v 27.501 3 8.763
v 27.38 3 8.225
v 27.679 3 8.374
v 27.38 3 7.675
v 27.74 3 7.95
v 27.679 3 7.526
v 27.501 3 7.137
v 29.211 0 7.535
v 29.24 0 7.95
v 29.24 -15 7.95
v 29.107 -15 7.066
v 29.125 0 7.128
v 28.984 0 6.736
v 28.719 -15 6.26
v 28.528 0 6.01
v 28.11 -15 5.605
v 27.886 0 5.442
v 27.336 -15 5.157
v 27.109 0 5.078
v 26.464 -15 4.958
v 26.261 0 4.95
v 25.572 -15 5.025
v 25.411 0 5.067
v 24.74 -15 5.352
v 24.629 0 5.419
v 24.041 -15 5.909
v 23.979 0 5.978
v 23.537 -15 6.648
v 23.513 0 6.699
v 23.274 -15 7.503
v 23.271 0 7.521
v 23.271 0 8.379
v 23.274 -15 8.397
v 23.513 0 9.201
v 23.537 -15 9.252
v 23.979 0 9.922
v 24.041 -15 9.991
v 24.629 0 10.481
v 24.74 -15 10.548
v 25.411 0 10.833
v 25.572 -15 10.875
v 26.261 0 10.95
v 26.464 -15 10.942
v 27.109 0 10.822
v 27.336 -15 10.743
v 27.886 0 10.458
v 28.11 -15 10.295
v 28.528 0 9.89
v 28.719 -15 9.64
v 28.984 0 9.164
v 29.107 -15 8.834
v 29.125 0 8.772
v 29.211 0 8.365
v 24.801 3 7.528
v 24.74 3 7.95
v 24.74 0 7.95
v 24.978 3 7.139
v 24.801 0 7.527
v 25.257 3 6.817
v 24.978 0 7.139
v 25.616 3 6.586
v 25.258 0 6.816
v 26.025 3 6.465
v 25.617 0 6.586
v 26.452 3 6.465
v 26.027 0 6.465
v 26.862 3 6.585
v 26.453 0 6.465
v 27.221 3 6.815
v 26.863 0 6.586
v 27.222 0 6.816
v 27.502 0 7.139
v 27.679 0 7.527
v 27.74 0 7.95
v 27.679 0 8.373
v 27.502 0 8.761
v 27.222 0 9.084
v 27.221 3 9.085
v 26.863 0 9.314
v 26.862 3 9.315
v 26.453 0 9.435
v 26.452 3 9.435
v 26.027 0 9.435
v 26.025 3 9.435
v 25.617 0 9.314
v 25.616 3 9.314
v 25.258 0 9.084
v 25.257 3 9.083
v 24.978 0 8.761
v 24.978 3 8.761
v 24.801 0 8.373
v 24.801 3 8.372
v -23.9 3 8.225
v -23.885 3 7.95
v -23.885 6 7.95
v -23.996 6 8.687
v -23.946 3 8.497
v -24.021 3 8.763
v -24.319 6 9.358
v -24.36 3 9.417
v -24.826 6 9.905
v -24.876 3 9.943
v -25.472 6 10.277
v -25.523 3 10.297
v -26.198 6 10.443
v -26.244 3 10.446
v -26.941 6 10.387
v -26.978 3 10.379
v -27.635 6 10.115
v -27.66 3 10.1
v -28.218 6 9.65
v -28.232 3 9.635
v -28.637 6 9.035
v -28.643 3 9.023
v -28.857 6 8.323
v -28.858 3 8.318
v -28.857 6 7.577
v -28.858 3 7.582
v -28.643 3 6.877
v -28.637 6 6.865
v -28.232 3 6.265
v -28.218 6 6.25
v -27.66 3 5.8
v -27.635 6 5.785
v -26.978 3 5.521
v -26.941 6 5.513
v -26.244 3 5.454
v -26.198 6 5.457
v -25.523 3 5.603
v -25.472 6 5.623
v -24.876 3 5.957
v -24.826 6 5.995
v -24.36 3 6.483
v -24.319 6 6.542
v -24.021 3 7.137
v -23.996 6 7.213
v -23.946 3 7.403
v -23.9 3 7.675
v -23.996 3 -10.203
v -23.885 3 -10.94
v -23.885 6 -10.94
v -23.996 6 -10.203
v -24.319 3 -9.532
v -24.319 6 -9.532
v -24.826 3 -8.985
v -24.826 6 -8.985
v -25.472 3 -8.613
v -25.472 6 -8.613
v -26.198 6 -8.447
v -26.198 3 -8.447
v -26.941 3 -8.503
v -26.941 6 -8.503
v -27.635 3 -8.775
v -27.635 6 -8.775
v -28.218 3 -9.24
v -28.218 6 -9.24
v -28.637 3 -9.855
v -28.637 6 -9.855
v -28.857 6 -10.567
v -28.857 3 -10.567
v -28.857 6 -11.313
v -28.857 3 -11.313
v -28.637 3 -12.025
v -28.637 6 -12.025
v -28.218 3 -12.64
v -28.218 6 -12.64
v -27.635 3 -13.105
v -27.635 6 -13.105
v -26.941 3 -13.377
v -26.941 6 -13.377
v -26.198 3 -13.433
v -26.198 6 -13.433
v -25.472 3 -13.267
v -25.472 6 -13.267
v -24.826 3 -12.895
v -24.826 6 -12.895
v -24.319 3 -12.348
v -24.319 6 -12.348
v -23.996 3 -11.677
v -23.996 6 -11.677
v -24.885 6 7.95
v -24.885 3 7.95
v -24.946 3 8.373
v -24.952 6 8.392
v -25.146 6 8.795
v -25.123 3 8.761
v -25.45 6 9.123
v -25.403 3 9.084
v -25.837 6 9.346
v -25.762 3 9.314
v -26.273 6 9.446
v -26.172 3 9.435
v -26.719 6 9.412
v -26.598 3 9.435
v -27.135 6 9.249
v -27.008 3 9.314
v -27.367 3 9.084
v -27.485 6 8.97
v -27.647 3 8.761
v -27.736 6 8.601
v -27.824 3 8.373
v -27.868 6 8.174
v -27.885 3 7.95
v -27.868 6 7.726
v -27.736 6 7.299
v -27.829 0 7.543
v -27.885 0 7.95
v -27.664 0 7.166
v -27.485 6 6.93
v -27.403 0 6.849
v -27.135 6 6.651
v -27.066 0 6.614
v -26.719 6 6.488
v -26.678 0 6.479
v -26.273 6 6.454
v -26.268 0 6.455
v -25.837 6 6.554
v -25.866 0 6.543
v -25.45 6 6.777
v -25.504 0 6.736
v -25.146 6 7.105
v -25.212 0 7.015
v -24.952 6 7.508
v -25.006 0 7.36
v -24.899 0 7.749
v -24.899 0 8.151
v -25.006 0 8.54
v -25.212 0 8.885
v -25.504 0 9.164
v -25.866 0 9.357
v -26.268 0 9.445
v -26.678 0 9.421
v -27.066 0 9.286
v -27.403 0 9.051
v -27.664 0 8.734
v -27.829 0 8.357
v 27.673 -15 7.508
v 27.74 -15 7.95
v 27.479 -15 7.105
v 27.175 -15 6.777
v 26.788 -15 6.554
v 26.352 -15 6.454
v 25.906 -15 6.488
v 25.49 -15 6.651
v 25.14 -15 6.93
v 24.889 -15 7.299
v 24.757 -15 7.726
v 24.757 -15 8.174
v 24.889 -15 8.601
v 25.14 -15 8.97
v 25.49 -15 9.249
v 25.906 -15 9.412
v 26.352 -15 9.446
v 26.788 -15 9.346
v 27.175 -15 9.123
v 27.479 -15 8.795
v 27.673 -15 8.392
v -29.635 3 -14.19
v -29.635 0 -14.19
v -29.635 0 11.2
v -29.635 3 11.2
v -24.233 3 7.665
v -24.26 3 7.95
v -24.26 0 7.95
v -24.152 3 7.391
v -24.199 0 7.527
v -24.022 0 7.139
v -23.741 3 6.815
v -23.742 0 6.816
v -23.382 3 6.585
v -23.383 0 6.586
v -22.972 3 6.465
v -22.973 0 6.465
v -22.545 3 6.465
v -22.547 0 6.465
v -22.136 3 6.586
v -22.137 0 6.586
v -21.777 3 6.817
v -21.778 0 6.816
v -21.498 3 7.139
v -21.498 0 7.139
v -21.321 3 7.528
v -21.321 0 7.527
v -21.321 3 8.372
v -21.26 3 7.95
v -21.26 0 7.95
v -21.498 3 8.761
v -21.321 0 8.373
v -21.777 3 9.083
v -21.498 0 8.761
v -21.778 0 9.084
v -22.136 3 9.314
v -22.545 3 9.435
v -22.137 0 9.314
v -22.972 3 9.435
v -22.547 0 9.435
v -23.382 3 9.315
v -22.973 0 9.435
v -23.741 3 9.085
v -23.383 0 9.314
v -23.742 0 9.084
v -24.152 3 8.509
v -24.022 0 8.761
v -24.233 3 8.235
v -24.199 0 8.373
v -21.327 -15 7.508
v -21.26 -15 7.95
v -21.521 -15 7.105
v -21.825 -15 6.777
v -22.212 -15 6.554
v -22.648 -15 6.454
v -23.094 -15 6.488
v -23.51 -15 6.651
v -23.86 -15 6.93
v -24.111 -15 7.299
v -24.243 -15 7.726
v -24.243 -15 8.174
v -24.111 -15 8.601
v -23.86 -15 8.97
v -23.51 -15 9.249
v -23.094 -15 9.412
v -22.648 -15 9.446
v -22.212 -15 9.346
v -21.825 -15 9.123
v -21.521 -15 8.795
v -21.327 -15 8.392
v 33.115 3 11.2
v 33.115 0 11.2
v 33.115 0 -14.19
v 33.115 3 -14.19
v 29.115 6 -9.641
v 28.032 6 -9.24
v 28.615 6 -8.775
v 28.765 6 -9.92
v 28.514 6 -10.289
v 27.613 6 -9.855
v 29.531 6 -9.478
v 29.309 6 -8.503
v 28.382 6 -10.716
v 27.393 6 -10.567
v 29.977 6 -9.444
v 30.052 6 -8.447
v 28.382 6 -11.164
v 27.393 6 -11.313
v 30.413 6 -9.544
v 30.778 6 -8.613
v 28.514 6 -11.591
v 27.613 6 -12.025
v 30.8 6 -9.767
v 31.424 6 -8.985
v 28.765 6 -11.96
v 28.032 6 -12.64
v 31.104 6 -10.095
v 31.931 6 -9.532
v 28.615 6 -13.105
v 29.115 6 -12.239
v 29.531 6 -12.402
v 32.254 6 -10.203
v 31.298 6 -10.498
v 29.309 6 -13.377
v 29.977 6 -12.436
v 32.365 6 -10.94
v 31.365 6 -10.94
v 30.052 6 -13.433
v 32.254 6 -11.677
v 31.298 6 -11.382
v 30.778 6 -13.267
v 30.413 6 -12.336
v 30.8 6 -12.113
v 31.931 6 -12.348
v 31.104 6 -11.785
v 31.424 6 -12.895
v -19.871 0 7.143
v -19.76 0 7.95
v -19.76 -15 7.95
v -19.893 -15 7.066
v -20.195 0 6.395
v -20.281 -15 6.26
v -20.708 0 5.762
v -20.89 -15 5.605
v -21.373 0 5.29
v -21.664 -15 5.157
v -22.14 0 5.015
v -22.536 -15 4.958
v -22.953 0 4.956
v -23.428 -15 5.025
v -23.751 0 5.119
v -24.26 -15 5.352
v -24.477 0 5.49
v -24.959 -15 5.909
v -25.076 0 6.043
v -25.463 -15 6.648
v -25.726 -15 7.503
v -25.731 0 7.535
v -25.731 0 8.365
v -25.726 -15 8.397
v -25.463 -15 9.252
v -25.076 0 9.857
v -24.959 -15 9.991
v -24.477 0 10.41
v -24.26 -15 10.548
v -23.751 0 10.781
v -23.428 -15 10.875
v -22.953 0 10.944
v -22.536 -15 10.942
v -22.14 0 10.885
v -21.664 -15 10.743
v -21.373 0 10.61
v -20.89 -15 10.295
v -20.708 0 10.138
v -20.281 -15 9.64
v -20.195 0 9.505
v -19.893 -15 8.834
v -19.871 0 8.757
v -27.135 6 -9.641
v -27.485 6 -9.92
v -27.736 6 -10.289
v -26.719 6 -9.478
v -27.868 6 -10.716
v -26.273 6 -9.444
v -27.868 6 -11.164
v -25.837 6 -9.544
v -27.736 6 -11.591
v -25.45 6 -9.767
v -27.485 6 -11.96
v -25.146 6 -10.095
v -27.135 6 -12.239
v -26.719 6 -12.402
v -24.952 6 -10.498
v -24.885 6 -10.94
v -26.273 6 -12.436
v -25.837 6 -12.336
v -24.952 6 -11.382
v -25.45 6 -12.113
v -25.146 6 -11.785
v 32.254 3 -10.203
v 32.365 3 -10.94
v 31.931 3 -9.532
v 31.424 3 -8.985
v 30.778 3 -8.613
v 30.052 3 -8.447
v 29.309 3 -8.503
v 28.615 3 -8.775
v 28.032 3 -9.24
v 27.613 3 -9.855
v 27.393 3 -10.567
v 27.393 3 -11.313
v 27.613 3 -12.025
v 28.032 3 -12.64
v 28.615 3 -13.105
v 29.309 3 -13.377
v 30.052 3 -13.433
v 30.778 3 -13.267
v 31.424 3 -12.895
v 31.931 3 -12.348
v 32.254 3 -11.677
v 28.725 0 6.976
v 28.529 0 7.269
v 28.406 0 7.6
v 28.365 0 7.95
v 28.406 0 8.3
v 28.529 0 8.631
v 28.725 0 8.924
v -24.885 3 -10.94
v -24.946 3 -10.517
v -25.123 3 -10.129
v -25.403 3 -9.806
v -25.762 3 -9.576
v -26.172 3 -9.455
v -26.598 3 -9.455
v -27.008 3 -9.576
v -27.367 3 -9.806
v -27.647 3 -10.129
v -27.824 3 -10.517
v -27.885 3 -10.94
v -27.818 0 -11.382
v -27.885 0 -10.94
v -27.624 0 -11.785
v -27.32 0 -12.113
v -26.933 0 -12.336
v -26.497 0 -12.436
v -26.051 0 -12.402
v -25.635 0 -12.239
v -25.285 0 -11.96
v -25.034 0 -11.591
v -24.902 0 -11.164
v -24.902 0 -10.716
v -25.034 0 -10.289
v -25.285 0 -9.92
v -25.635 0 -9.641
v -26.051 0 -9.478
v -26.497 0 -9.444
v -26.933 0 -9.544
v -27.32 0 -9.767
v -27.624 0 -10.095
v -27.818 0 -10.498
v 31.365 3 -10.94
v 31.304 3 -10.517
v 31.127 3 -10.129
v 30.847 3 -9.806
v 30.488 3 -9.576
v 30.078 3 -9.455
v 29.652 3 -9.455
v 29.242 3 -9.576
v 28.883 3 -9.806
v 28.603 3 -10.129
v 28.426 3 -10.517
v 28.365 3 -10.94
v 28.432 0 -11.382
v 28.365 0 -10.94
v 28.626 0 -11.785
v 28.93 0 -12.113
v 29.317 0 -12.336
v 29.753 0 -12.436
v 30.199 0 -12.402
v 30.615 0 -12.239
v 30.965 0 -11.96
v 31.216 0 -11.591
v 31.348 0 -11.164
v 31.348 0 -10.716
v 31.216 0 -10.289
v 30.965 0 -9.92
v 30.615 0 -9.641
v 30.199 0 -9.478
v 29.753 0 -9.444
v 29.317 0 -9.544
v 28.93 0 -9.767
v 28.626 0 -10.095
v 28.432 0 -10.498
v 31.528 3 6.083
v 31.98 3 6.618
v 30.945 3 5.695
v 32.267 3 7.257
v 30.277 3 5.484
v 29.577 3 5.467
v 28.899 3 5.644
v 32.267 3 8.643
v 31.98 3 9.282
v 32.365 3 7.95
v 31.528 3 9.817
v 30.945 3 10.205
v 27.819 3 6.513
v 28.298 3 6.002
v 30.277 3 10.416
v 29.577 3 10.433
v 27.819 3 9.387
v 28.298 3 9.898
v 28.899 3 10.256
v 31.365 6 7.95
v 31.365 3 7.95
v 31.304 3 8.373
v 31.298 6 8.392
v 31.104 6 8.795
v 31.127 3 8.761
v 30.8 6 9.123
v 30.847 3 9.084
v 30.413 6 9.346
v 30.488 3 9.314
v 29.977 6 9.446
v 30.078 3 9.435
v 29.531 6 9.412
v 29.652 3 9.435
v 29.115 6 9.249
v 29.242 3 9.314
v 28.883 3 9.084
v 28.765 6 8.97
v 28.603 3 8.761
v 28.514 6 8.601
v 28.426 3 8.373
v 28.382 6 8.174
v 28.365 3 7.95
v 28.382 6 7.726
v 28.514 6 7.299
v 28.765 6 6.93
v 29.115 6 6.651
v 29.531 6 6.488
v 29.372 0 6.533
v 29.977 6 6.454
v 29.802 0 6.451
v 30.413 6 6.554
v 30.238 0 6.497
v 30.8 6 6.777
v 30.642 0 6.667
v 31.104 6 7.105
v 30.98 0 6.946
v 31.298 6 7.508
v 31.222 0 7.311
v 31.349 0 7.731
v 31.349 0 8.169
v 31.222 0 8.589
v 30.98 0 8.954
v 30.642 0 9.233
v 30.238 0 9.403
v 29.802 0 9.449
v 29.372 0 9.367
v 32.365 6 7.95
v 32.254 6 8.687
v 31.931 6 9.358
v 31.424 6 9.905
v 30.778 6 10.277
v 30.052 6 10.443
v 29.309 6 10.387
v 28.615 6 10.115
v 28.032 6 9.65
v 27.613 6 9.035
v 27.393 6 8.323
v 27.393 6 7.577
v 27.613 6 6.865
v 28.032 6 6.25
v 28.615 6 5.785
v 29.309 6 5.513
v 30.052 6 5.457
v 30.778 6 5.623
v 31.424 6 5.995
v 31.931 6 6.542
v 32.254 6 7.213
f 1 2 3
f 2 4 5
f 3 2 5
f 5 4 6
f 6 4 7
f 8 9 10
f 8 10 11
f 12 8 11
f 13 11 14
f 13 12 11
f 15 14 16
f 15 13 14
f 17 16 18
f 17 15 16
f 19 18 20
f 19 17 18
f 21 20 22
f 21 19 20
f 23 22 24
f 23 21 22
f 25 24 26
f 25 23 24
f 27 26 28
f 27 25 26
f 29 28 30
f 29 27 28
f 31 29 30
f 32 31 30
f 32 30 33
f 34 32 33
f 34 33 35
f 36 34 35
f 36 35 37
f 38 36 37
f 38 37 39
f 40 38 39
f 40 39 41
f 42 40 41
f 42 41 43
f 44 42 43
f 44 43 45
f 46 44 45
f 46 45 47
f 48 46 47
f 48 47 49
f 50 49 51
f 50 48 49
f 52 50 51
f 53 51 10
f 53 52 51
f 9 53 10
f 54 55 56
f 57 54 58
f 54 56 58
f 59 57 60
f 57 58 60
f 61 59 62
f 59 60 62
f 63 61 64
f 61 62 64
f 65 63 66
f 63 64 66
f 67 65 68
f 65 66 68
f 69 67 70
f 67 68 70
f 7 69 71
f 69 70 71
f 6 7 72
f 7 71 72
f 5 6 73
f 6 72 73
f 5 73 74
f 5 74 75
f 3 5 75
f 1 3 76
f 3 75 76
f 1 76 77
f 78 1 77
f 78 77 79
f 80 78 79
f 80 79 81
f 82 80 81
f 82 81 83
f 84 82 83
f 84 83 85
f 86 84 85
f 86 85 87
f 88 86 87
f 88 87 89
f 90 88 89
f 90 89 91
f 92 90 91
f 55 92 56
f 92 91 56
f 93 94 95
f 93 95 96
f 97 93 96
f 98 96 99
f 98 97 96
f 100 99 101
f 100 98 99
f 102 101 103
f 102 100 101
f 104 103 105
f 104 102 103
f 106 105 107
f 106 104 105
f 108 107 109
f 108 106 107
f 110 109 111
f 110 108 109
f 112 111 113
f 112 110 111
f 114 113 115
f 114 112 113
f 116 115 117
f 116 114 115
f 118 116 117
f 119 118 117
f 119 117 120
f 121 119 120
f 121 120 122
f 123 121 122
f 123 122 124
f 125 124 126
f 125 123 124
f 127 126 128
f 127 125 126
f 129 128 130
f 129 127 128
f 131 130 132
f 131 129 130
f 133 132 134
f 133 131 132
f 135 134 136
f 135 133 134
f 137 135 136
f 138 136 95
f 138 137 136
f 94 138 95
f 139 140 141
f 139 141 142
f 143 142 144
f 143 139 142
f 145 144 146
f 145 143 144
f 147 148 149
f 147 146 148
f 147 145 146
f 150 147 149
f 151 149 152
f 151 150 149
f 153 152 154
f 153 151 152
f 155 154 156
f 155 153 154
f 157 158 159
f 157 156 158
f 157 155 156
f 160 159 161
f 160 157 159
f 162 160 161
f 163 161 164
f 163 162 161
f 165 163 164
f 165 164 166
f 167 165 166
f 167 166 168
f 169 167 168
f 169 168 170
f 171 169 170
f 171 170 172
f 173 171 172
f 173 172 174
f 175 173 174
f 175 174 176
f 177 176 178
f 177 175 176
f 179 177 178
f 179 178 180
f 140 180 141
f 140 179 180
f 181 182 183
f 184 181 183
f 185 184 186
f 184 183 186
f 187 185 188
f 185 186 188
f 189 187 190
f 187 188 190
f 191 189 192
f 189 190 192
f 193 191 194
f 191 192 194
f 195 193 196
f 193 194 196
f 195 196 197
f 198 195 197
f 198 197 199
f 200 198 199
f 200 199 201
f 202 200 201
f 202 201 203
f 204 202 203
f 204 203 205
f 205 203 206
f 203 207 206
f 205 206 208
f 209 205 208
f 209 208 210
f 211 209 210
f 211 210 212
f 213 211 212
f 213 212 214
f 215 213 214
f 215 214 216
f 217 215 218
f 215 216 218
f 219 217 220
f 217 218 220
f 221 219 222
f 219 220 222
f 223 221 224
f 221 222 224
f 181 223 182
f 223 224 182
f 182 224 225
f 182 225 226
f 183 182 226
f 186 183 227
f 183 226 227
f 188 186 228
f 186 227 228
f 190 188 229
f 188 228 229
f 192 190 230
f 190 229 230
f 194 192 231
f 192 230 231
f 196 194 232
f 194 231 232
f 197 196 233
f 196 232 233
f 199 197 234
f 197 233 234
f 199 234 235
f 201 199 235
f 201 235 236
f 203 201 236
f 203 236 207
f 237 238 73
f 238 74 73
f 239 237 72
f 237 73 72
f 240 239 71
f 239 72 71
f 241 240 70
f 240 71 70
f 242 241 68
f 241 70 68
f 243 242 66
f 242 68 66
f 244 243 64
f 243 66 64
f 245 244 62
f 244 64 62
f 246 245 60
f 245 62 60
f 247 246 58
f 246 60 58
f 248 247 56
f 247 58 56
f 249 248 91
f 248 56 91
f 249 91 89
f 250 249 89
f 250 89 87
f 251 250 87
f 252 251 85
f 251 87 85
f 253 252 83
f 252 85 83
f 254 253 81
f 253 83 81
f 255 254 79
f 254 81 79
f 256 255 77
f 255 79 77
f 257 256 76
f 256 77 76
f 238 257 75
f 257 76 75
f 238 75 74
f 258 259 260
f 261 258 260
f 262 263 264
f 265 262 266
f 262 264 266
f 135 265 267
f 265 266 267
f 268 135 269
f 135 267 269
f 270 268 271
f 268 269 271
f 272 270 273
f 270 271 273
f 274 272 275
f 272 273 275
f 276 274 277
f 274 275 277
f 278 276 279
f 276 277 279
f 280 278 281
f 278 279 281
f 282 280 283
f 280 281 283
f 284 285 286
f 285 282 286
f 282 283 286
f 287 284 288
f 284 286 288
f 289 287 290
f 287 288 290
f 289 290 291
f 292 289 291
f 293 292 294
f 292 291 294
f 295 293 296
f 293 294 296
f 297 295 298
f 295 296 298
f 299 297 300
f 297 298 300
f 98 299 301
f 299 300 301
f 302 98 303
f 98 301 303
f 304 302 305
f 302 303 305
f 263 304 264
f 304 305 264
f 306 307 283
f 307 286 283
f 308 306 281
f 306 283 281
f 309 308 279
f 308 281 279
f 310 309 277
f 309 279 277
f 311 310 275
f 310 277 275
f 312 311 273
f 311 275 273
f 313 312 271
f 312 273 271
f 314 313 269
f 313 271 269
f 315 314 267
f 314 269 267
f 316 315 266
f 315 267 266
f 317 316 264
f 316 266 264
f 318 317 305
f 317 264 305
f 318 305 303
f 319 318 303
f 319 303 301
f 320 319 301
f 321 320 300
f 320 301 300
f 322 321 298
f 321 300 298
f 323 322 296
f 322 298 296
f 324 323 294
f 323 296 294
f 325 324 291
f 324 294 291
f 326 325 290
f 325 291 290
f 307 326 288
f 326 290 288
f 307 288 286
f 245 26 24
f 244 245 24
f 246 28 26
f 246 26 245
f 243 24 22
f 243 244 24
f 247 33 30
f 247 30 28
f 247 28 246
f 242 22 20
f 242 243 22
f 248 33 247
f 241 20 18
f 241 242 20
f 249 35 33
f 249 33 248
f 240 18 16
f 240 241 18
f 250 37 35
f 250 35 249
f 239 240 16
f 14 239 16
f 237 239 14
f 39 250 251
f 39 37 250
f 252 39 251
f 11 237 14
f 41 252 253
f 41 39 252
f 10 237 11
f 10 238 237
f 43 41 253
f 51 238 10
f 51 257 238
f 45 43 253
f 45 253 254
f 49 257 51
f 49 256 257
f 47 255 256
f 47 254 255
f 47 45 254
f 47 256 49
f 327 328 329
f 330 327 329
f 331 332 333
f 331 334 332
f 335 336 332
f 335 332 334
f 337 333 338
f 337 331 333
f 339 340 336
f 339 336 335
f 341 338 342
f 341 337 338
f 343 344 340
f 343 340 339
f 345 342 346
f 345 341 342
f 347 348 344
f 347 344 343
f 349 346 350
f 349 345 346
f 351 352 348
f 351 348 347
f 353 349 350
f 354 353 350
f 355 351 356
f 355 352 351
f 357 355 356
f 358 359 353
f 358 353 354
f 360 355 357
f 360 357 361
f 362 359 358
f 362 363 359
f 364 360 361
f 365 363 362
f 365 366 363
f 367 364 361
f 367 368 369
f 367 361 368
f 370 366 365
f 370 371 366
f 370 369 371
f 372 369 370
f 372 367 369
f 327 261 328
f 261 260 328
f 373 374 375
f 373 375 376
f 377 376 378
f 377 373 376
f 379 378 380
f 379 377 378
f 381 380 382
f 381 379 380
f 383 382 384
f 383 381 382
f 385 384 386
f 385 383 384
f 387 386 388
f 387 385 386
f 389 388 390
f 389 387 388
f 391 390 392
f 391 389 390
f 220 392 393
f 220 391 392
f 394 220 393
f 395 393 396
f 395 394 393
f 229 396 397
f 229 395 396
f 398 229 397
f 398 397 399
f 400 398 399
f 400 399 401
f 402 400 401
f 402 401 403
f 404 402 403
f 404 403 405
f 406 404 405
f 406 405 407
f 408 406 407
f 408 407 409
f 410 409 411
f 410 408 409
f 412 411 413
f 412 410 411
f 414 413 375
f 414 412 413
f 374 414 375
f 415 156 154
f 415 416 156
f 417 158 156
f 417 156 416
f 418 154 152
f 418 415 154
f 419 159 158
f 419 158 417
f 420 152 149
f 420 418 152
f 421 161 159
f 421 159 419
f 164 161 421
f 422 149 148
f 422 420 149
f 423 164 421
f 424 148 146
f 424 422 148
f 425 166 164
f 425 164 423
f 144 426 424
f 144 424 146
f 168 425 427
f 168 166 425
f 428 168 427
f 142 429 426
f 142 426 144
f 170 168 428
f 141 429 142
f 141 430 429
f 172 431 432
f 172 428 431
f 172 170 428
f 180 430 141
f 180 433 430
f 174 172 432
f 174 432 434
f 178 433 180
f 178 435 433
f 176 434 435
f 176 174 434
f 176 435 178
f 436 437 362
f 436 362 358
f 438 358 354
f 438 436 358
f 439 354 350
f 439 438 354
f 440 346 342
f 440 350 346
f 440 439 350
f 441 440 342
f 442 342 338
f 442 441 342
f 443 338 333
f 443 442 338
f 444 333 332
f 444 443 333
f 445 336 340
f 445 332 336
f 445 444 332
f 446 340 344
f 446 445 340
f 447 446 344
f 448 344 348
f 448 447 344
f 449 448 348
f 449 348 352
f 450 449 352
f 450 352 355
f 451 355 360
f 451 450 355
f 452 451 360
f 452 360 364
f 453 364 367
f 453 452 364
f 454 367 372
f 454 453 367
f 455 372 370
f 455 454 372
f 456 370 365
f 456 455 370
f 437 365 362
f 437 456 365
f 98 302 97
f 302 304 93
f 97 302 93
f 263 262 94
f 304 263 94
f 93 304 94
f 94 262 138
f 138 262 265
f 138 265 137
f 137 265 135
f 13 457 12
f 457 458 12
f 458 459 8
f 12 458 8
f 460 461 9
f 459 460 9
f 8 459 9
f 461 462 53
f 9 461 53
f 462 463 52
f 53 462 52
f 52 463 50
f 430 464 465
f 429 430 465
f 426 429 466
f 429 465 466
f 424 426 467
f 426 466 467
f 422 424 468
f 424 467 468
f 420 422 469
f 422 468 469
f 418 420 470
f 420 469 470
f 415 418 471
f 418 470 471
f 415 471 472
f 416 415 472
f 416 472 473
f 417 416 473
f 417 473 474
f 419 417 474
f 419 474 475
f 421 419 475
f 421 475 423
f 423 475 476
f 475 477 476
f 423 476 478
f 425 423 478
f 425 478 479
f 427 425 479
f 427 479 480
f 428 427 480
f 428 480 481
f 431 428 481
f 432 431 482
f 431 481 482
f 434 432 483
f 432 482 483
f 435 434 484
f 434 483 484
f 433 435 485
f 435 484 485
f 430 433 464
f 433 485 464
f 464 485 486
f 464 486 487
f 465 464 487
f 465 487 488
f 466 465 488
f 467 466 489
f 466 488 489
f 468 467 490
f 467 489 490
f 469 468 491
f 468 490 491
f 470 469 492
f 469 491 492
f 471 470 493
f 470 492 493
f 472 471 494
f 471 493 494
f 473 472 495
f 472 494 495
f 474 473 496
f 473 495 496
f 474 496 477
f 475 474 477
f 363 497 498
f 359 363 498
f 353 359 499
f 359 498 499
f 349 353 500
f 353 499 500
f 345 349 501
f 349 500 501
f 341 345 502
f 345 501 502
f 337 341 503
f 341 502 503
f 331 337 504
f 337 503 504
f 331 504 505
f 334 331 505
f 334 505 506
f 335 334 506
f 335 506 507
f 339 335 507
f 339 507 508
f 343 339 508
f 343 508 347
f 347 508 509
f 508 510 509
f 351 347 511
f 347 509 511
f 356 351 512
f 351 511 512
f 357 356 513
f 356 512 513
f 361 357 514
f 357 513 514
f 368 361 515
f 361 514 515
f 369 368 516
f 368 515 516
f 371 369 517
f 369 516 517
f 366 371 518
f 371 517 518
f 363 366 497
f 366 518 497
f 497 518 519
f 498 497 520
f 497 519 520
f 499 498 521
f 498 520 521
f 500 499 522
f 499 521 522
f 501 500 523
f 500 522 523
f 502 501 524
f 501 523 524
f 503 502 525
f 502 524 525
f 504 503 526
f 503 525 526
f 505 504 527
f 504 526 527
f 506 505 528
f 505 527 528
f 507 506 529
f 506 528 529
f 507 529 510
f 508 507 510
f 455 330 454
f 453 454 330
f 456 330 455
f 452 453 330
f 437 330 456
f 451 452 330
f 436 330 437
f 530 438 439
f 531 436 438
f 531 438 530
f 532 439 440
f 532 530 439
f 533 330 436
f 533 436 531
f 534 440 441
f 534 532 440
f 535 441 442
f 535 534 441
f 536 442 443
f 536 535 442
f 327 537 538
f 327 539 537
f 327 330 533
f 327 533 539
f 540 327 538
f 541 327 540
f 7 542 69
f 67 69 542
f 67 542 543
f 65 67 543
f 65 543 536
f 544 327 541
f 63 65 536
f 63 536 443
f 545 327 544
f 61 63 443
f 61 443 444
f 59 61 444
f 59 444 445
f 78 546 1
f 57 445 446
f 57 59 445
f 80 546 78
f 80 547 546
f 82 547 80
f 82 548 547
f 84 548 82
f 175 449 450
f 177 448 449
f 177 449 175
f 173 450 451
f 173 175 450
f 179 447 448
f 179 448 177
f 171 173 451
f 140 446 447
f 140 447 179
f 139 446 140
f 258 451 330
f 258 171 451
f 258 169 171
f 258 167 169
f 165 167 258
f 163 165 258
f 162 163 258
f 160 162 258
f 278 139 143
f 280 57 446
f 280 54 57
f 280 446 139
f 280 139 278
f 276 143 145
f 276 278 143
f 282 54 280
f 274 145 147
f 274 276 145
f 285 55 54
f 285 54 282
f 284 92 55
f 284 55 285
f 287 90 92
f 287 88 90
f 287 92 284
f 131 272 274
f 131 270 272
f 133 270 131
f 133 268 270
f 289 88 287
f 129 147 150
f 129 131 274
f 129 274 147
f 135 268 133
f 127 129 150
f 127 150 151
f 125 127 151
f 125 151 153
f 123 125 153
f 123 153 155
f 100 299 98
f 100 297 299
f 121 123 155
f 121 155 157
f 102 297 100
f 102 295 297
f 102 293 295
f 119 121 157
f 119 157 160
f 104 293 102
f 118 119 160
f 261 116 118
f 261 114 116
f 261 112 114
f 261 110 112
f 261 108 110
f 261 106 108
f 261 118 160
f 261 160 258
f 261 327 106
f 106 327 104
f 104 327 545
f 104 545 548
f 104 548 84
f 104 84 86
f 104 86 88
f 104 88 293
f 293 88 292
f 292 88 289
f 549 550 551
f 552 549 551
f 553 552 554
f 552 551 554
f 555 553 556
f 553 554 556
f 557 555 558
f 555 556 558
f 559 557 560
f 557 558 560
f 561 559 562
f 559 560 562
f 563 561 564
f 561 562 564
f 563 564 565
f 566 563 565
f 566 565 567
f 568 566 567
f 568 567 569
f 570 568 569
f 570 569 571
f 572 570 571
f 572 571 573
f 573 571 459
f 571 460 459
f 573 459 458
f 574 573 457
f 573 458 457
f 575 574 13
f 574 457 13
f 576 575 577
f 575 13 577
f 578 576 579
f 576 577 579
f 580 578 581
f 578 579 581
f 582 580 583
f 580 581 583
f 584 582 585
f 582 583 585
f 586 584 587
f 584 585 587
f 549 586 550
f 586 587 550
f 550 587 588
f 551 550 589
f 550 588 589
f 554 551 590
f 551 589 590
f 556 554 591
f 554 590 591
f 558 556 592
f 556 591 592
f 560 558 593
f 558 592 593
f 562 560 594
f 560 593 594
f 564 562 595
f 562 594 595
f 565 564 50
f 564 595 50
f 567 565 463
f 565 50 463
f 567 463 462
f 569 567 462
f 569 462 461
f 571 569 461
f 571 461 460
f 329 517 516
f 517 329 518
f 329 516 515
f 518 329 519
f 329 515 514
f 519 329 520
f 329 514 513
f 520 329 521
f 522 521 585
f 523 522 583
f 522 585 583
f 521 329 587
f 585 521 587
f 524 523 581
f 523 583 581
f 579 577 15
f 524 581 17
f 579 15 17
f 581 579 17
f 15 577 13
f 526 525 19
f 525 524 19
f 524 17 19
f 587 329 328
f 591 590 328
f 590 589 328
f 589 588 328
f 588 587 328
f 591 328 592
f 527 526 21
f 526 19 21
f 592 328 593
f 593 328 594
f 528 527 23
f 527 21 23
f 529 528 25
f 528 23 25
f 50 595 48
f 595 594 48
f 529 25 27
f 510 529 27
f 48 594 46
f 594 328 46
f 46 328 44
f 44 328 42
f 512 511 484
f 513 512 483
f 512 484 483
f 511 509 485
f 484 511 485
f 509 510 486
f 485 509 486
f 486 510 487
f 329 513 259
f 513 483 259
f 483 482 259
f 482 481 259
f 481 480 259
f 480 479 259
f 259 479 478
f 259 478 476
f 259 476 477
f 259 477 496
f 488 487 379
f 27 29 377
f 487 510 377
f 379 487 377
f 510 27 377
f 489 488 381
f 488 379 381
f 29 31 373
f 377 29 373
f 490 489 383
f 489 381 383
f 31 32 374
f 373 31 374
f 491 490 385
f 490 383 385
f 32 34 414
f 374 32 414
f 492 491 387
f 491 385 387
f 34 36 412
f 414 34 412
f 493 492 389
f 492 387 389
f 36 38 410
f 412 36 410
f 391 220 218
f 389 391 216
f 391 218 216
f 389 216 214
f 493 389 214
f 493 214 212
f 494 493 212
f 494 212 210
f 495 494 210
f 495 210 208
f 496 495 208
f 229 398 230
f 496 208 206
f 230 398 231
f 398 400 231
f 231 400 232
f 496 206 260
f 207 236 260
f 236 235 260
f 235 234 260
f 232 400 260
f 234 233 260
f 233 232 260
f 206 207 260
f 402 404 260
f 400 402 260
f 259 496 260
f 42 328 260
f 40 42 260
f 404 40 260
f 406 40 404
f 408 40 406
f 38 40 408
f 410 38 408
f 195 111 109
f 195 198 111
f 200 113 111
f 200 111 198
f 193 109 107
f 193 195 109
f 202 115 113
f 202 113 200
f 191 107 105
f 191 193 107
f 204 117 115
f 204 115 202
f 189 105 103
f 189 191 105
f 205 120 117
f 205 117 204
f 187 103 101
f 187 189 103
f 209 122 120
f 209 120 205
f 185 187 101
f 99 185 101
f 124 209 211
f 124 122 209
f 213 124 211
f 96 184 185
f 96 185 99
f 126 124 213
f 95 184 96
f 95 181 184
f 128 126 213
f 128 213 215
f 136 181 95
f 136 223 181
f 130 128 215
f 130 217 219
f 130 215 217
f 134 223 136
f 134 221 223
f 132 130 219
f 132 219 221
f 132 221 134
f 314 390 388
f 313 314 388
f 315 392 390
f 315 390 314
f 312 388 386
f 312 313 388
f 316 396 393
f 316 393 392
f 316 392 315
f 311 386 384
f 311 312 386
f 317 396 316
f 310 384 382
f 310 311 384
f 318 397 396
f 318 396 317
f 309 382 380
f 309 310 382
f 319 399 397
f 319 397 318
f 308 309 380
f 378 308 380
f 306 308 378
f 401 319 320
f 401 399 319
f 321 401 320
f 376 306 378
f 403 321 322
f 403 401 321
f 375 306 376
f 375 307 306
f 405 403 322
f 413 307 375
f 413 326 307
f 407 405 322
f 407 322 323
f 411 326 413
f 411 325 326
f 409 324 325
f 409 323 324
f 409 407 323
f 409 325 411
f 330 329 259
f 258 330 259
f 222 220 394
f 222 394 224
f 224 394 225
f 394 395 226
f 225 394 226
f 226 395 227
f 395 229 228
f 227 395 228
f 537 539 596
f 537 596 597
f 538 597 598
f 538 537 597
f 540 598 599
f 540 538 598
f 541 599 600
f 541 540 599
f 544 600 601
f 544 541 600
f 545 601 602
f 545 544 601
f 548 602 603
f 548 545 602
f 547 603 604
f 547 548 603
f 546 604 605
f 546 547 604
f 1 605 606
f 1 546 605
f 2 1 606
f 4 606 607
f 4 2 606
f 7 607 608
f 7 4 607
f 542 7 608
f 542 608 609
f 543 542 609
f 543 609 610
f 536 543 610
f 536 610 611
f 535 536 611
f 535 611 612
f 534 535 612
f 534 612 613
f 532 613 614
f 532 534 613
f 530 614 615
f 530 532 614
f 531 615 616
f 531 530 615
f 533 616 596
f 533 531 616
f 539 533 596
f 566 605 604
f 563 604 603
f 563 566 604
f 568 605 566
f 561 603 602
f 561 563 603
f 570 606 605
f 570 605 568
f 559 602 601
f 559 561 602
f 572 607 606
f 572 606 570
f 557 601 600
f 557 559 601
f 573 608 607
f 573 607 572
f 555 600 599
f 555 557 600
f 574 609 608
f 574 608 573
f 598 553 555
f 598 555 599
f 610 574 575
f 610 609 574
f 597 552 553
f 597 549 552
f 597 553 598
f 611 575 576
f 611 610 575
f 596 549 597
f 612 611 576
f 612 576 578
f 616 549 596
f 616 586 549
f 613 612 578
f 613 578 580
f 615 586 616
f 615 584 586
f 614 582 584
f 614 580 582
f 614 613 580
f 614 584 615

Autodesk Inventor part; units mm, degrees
ref_plane "YZ Plane" through (0, 0, 0) normal (1, 0, 0) x (0, 1, 0)
ref_plane "XZ Plane" through (0, 0, 0) normal (0, 1, 0) x (-1, 0, 0)
ref_plane "XY Plane" through (0, 0, 0) normal (0, 0, 1) x (1, 0, 0)
sketch "Boceto1" plane through (0, 0, 0) normal (0, 1, 0) x (-1, 0, 0)
  circle A0 centre (22.76, 7.95) radius 1.5
  circle A1 centre (-26.24, 7.95) radius 1.5
  line L0 (29.635, -14.19) -> (29.635, 11.2)
  line L1 (29.635, 11.2) -> (-33.115, 11.2)
  line L2 (-33.115, 11.2) -> (-33.115, -14.19)
  line L3 (-33.115, -14.19) -> (29.635, -14.19)
  line L4 (-1.74, -3.0983) -> (-1.74, -1.495)
  line L5 (-1.74, -1.495) -> (-3.5727, -1.495)
  circle A2 centre (26.385, -10.94) radius 1.5
  circle A3 centre (-29.865, -10.94) radius 1.5
  circle A4 centre (26.385, 7.95) radius 1.5
  circle A5 centre (-29.865, 7.95) radius 1.5
  dimension "d5" = 25.39
  dimension "d6" = 62.75
  dimension "d7" = 3
  dimension "d8" = 3.25
  dimension "d9" = 3.25
  dimension "d10" = 49
  dimension "d11" = 0
  dimension "d24" = 3
extrude "Extrusión1" add sketch "Boceto1" along normal blind 3
sketch "Boceto2" plane through (0, 3, 0) normal (0, 1, 0) x (1, 0, 0)
  circle A0 centre (-26.385, -7.95) radius 1.5 projected
  circle A1 centre (-26.385, -7.95) radius 2.5
  circle A2 centre (-26.385, 10.94) radius 1.5 projected
  circle A3 centre (-26.385, 10.94) radius 2.5
  circle A4 centre (29.865, 10.94) radius 1.5 projected
  circle A5 centre (29.865, 10.94) radius 2.5
  circle A6 centre (29.865, -7.95) radius 1.5 projected
  circle A7 centre (29.865, -7.95) radius 2.5
  point P0 (0, 0)
  dimension "d14" = 5
  dimension "d15" = 5
  dimension "d16" = 5
  dimension "d17" = 5
extrude "Extrusión2" add sketch "Boceto2" along normal blind 3
sketch "Boceto3" plane through (0, 0, 0) normal (0, -1, 0) x (1, 0, 0)
  circle A0 centre (-22.76, 7.95) radius 1.5 projected
  circle A1 centre (-22.76, 7.95) radius 3
  circle A2 centre (26.24, 7.95) radius 1.5 projected
  circle A3 centre (26.24, 7.95) radius 3
  point P0 (0, 0)
  dimension "d20" = 6
  dimension "d21" = 6
extrude "Extrusión3" add sketch "Boceto3" along normal blind 15
properties part number "Soporte 16 pwm"
